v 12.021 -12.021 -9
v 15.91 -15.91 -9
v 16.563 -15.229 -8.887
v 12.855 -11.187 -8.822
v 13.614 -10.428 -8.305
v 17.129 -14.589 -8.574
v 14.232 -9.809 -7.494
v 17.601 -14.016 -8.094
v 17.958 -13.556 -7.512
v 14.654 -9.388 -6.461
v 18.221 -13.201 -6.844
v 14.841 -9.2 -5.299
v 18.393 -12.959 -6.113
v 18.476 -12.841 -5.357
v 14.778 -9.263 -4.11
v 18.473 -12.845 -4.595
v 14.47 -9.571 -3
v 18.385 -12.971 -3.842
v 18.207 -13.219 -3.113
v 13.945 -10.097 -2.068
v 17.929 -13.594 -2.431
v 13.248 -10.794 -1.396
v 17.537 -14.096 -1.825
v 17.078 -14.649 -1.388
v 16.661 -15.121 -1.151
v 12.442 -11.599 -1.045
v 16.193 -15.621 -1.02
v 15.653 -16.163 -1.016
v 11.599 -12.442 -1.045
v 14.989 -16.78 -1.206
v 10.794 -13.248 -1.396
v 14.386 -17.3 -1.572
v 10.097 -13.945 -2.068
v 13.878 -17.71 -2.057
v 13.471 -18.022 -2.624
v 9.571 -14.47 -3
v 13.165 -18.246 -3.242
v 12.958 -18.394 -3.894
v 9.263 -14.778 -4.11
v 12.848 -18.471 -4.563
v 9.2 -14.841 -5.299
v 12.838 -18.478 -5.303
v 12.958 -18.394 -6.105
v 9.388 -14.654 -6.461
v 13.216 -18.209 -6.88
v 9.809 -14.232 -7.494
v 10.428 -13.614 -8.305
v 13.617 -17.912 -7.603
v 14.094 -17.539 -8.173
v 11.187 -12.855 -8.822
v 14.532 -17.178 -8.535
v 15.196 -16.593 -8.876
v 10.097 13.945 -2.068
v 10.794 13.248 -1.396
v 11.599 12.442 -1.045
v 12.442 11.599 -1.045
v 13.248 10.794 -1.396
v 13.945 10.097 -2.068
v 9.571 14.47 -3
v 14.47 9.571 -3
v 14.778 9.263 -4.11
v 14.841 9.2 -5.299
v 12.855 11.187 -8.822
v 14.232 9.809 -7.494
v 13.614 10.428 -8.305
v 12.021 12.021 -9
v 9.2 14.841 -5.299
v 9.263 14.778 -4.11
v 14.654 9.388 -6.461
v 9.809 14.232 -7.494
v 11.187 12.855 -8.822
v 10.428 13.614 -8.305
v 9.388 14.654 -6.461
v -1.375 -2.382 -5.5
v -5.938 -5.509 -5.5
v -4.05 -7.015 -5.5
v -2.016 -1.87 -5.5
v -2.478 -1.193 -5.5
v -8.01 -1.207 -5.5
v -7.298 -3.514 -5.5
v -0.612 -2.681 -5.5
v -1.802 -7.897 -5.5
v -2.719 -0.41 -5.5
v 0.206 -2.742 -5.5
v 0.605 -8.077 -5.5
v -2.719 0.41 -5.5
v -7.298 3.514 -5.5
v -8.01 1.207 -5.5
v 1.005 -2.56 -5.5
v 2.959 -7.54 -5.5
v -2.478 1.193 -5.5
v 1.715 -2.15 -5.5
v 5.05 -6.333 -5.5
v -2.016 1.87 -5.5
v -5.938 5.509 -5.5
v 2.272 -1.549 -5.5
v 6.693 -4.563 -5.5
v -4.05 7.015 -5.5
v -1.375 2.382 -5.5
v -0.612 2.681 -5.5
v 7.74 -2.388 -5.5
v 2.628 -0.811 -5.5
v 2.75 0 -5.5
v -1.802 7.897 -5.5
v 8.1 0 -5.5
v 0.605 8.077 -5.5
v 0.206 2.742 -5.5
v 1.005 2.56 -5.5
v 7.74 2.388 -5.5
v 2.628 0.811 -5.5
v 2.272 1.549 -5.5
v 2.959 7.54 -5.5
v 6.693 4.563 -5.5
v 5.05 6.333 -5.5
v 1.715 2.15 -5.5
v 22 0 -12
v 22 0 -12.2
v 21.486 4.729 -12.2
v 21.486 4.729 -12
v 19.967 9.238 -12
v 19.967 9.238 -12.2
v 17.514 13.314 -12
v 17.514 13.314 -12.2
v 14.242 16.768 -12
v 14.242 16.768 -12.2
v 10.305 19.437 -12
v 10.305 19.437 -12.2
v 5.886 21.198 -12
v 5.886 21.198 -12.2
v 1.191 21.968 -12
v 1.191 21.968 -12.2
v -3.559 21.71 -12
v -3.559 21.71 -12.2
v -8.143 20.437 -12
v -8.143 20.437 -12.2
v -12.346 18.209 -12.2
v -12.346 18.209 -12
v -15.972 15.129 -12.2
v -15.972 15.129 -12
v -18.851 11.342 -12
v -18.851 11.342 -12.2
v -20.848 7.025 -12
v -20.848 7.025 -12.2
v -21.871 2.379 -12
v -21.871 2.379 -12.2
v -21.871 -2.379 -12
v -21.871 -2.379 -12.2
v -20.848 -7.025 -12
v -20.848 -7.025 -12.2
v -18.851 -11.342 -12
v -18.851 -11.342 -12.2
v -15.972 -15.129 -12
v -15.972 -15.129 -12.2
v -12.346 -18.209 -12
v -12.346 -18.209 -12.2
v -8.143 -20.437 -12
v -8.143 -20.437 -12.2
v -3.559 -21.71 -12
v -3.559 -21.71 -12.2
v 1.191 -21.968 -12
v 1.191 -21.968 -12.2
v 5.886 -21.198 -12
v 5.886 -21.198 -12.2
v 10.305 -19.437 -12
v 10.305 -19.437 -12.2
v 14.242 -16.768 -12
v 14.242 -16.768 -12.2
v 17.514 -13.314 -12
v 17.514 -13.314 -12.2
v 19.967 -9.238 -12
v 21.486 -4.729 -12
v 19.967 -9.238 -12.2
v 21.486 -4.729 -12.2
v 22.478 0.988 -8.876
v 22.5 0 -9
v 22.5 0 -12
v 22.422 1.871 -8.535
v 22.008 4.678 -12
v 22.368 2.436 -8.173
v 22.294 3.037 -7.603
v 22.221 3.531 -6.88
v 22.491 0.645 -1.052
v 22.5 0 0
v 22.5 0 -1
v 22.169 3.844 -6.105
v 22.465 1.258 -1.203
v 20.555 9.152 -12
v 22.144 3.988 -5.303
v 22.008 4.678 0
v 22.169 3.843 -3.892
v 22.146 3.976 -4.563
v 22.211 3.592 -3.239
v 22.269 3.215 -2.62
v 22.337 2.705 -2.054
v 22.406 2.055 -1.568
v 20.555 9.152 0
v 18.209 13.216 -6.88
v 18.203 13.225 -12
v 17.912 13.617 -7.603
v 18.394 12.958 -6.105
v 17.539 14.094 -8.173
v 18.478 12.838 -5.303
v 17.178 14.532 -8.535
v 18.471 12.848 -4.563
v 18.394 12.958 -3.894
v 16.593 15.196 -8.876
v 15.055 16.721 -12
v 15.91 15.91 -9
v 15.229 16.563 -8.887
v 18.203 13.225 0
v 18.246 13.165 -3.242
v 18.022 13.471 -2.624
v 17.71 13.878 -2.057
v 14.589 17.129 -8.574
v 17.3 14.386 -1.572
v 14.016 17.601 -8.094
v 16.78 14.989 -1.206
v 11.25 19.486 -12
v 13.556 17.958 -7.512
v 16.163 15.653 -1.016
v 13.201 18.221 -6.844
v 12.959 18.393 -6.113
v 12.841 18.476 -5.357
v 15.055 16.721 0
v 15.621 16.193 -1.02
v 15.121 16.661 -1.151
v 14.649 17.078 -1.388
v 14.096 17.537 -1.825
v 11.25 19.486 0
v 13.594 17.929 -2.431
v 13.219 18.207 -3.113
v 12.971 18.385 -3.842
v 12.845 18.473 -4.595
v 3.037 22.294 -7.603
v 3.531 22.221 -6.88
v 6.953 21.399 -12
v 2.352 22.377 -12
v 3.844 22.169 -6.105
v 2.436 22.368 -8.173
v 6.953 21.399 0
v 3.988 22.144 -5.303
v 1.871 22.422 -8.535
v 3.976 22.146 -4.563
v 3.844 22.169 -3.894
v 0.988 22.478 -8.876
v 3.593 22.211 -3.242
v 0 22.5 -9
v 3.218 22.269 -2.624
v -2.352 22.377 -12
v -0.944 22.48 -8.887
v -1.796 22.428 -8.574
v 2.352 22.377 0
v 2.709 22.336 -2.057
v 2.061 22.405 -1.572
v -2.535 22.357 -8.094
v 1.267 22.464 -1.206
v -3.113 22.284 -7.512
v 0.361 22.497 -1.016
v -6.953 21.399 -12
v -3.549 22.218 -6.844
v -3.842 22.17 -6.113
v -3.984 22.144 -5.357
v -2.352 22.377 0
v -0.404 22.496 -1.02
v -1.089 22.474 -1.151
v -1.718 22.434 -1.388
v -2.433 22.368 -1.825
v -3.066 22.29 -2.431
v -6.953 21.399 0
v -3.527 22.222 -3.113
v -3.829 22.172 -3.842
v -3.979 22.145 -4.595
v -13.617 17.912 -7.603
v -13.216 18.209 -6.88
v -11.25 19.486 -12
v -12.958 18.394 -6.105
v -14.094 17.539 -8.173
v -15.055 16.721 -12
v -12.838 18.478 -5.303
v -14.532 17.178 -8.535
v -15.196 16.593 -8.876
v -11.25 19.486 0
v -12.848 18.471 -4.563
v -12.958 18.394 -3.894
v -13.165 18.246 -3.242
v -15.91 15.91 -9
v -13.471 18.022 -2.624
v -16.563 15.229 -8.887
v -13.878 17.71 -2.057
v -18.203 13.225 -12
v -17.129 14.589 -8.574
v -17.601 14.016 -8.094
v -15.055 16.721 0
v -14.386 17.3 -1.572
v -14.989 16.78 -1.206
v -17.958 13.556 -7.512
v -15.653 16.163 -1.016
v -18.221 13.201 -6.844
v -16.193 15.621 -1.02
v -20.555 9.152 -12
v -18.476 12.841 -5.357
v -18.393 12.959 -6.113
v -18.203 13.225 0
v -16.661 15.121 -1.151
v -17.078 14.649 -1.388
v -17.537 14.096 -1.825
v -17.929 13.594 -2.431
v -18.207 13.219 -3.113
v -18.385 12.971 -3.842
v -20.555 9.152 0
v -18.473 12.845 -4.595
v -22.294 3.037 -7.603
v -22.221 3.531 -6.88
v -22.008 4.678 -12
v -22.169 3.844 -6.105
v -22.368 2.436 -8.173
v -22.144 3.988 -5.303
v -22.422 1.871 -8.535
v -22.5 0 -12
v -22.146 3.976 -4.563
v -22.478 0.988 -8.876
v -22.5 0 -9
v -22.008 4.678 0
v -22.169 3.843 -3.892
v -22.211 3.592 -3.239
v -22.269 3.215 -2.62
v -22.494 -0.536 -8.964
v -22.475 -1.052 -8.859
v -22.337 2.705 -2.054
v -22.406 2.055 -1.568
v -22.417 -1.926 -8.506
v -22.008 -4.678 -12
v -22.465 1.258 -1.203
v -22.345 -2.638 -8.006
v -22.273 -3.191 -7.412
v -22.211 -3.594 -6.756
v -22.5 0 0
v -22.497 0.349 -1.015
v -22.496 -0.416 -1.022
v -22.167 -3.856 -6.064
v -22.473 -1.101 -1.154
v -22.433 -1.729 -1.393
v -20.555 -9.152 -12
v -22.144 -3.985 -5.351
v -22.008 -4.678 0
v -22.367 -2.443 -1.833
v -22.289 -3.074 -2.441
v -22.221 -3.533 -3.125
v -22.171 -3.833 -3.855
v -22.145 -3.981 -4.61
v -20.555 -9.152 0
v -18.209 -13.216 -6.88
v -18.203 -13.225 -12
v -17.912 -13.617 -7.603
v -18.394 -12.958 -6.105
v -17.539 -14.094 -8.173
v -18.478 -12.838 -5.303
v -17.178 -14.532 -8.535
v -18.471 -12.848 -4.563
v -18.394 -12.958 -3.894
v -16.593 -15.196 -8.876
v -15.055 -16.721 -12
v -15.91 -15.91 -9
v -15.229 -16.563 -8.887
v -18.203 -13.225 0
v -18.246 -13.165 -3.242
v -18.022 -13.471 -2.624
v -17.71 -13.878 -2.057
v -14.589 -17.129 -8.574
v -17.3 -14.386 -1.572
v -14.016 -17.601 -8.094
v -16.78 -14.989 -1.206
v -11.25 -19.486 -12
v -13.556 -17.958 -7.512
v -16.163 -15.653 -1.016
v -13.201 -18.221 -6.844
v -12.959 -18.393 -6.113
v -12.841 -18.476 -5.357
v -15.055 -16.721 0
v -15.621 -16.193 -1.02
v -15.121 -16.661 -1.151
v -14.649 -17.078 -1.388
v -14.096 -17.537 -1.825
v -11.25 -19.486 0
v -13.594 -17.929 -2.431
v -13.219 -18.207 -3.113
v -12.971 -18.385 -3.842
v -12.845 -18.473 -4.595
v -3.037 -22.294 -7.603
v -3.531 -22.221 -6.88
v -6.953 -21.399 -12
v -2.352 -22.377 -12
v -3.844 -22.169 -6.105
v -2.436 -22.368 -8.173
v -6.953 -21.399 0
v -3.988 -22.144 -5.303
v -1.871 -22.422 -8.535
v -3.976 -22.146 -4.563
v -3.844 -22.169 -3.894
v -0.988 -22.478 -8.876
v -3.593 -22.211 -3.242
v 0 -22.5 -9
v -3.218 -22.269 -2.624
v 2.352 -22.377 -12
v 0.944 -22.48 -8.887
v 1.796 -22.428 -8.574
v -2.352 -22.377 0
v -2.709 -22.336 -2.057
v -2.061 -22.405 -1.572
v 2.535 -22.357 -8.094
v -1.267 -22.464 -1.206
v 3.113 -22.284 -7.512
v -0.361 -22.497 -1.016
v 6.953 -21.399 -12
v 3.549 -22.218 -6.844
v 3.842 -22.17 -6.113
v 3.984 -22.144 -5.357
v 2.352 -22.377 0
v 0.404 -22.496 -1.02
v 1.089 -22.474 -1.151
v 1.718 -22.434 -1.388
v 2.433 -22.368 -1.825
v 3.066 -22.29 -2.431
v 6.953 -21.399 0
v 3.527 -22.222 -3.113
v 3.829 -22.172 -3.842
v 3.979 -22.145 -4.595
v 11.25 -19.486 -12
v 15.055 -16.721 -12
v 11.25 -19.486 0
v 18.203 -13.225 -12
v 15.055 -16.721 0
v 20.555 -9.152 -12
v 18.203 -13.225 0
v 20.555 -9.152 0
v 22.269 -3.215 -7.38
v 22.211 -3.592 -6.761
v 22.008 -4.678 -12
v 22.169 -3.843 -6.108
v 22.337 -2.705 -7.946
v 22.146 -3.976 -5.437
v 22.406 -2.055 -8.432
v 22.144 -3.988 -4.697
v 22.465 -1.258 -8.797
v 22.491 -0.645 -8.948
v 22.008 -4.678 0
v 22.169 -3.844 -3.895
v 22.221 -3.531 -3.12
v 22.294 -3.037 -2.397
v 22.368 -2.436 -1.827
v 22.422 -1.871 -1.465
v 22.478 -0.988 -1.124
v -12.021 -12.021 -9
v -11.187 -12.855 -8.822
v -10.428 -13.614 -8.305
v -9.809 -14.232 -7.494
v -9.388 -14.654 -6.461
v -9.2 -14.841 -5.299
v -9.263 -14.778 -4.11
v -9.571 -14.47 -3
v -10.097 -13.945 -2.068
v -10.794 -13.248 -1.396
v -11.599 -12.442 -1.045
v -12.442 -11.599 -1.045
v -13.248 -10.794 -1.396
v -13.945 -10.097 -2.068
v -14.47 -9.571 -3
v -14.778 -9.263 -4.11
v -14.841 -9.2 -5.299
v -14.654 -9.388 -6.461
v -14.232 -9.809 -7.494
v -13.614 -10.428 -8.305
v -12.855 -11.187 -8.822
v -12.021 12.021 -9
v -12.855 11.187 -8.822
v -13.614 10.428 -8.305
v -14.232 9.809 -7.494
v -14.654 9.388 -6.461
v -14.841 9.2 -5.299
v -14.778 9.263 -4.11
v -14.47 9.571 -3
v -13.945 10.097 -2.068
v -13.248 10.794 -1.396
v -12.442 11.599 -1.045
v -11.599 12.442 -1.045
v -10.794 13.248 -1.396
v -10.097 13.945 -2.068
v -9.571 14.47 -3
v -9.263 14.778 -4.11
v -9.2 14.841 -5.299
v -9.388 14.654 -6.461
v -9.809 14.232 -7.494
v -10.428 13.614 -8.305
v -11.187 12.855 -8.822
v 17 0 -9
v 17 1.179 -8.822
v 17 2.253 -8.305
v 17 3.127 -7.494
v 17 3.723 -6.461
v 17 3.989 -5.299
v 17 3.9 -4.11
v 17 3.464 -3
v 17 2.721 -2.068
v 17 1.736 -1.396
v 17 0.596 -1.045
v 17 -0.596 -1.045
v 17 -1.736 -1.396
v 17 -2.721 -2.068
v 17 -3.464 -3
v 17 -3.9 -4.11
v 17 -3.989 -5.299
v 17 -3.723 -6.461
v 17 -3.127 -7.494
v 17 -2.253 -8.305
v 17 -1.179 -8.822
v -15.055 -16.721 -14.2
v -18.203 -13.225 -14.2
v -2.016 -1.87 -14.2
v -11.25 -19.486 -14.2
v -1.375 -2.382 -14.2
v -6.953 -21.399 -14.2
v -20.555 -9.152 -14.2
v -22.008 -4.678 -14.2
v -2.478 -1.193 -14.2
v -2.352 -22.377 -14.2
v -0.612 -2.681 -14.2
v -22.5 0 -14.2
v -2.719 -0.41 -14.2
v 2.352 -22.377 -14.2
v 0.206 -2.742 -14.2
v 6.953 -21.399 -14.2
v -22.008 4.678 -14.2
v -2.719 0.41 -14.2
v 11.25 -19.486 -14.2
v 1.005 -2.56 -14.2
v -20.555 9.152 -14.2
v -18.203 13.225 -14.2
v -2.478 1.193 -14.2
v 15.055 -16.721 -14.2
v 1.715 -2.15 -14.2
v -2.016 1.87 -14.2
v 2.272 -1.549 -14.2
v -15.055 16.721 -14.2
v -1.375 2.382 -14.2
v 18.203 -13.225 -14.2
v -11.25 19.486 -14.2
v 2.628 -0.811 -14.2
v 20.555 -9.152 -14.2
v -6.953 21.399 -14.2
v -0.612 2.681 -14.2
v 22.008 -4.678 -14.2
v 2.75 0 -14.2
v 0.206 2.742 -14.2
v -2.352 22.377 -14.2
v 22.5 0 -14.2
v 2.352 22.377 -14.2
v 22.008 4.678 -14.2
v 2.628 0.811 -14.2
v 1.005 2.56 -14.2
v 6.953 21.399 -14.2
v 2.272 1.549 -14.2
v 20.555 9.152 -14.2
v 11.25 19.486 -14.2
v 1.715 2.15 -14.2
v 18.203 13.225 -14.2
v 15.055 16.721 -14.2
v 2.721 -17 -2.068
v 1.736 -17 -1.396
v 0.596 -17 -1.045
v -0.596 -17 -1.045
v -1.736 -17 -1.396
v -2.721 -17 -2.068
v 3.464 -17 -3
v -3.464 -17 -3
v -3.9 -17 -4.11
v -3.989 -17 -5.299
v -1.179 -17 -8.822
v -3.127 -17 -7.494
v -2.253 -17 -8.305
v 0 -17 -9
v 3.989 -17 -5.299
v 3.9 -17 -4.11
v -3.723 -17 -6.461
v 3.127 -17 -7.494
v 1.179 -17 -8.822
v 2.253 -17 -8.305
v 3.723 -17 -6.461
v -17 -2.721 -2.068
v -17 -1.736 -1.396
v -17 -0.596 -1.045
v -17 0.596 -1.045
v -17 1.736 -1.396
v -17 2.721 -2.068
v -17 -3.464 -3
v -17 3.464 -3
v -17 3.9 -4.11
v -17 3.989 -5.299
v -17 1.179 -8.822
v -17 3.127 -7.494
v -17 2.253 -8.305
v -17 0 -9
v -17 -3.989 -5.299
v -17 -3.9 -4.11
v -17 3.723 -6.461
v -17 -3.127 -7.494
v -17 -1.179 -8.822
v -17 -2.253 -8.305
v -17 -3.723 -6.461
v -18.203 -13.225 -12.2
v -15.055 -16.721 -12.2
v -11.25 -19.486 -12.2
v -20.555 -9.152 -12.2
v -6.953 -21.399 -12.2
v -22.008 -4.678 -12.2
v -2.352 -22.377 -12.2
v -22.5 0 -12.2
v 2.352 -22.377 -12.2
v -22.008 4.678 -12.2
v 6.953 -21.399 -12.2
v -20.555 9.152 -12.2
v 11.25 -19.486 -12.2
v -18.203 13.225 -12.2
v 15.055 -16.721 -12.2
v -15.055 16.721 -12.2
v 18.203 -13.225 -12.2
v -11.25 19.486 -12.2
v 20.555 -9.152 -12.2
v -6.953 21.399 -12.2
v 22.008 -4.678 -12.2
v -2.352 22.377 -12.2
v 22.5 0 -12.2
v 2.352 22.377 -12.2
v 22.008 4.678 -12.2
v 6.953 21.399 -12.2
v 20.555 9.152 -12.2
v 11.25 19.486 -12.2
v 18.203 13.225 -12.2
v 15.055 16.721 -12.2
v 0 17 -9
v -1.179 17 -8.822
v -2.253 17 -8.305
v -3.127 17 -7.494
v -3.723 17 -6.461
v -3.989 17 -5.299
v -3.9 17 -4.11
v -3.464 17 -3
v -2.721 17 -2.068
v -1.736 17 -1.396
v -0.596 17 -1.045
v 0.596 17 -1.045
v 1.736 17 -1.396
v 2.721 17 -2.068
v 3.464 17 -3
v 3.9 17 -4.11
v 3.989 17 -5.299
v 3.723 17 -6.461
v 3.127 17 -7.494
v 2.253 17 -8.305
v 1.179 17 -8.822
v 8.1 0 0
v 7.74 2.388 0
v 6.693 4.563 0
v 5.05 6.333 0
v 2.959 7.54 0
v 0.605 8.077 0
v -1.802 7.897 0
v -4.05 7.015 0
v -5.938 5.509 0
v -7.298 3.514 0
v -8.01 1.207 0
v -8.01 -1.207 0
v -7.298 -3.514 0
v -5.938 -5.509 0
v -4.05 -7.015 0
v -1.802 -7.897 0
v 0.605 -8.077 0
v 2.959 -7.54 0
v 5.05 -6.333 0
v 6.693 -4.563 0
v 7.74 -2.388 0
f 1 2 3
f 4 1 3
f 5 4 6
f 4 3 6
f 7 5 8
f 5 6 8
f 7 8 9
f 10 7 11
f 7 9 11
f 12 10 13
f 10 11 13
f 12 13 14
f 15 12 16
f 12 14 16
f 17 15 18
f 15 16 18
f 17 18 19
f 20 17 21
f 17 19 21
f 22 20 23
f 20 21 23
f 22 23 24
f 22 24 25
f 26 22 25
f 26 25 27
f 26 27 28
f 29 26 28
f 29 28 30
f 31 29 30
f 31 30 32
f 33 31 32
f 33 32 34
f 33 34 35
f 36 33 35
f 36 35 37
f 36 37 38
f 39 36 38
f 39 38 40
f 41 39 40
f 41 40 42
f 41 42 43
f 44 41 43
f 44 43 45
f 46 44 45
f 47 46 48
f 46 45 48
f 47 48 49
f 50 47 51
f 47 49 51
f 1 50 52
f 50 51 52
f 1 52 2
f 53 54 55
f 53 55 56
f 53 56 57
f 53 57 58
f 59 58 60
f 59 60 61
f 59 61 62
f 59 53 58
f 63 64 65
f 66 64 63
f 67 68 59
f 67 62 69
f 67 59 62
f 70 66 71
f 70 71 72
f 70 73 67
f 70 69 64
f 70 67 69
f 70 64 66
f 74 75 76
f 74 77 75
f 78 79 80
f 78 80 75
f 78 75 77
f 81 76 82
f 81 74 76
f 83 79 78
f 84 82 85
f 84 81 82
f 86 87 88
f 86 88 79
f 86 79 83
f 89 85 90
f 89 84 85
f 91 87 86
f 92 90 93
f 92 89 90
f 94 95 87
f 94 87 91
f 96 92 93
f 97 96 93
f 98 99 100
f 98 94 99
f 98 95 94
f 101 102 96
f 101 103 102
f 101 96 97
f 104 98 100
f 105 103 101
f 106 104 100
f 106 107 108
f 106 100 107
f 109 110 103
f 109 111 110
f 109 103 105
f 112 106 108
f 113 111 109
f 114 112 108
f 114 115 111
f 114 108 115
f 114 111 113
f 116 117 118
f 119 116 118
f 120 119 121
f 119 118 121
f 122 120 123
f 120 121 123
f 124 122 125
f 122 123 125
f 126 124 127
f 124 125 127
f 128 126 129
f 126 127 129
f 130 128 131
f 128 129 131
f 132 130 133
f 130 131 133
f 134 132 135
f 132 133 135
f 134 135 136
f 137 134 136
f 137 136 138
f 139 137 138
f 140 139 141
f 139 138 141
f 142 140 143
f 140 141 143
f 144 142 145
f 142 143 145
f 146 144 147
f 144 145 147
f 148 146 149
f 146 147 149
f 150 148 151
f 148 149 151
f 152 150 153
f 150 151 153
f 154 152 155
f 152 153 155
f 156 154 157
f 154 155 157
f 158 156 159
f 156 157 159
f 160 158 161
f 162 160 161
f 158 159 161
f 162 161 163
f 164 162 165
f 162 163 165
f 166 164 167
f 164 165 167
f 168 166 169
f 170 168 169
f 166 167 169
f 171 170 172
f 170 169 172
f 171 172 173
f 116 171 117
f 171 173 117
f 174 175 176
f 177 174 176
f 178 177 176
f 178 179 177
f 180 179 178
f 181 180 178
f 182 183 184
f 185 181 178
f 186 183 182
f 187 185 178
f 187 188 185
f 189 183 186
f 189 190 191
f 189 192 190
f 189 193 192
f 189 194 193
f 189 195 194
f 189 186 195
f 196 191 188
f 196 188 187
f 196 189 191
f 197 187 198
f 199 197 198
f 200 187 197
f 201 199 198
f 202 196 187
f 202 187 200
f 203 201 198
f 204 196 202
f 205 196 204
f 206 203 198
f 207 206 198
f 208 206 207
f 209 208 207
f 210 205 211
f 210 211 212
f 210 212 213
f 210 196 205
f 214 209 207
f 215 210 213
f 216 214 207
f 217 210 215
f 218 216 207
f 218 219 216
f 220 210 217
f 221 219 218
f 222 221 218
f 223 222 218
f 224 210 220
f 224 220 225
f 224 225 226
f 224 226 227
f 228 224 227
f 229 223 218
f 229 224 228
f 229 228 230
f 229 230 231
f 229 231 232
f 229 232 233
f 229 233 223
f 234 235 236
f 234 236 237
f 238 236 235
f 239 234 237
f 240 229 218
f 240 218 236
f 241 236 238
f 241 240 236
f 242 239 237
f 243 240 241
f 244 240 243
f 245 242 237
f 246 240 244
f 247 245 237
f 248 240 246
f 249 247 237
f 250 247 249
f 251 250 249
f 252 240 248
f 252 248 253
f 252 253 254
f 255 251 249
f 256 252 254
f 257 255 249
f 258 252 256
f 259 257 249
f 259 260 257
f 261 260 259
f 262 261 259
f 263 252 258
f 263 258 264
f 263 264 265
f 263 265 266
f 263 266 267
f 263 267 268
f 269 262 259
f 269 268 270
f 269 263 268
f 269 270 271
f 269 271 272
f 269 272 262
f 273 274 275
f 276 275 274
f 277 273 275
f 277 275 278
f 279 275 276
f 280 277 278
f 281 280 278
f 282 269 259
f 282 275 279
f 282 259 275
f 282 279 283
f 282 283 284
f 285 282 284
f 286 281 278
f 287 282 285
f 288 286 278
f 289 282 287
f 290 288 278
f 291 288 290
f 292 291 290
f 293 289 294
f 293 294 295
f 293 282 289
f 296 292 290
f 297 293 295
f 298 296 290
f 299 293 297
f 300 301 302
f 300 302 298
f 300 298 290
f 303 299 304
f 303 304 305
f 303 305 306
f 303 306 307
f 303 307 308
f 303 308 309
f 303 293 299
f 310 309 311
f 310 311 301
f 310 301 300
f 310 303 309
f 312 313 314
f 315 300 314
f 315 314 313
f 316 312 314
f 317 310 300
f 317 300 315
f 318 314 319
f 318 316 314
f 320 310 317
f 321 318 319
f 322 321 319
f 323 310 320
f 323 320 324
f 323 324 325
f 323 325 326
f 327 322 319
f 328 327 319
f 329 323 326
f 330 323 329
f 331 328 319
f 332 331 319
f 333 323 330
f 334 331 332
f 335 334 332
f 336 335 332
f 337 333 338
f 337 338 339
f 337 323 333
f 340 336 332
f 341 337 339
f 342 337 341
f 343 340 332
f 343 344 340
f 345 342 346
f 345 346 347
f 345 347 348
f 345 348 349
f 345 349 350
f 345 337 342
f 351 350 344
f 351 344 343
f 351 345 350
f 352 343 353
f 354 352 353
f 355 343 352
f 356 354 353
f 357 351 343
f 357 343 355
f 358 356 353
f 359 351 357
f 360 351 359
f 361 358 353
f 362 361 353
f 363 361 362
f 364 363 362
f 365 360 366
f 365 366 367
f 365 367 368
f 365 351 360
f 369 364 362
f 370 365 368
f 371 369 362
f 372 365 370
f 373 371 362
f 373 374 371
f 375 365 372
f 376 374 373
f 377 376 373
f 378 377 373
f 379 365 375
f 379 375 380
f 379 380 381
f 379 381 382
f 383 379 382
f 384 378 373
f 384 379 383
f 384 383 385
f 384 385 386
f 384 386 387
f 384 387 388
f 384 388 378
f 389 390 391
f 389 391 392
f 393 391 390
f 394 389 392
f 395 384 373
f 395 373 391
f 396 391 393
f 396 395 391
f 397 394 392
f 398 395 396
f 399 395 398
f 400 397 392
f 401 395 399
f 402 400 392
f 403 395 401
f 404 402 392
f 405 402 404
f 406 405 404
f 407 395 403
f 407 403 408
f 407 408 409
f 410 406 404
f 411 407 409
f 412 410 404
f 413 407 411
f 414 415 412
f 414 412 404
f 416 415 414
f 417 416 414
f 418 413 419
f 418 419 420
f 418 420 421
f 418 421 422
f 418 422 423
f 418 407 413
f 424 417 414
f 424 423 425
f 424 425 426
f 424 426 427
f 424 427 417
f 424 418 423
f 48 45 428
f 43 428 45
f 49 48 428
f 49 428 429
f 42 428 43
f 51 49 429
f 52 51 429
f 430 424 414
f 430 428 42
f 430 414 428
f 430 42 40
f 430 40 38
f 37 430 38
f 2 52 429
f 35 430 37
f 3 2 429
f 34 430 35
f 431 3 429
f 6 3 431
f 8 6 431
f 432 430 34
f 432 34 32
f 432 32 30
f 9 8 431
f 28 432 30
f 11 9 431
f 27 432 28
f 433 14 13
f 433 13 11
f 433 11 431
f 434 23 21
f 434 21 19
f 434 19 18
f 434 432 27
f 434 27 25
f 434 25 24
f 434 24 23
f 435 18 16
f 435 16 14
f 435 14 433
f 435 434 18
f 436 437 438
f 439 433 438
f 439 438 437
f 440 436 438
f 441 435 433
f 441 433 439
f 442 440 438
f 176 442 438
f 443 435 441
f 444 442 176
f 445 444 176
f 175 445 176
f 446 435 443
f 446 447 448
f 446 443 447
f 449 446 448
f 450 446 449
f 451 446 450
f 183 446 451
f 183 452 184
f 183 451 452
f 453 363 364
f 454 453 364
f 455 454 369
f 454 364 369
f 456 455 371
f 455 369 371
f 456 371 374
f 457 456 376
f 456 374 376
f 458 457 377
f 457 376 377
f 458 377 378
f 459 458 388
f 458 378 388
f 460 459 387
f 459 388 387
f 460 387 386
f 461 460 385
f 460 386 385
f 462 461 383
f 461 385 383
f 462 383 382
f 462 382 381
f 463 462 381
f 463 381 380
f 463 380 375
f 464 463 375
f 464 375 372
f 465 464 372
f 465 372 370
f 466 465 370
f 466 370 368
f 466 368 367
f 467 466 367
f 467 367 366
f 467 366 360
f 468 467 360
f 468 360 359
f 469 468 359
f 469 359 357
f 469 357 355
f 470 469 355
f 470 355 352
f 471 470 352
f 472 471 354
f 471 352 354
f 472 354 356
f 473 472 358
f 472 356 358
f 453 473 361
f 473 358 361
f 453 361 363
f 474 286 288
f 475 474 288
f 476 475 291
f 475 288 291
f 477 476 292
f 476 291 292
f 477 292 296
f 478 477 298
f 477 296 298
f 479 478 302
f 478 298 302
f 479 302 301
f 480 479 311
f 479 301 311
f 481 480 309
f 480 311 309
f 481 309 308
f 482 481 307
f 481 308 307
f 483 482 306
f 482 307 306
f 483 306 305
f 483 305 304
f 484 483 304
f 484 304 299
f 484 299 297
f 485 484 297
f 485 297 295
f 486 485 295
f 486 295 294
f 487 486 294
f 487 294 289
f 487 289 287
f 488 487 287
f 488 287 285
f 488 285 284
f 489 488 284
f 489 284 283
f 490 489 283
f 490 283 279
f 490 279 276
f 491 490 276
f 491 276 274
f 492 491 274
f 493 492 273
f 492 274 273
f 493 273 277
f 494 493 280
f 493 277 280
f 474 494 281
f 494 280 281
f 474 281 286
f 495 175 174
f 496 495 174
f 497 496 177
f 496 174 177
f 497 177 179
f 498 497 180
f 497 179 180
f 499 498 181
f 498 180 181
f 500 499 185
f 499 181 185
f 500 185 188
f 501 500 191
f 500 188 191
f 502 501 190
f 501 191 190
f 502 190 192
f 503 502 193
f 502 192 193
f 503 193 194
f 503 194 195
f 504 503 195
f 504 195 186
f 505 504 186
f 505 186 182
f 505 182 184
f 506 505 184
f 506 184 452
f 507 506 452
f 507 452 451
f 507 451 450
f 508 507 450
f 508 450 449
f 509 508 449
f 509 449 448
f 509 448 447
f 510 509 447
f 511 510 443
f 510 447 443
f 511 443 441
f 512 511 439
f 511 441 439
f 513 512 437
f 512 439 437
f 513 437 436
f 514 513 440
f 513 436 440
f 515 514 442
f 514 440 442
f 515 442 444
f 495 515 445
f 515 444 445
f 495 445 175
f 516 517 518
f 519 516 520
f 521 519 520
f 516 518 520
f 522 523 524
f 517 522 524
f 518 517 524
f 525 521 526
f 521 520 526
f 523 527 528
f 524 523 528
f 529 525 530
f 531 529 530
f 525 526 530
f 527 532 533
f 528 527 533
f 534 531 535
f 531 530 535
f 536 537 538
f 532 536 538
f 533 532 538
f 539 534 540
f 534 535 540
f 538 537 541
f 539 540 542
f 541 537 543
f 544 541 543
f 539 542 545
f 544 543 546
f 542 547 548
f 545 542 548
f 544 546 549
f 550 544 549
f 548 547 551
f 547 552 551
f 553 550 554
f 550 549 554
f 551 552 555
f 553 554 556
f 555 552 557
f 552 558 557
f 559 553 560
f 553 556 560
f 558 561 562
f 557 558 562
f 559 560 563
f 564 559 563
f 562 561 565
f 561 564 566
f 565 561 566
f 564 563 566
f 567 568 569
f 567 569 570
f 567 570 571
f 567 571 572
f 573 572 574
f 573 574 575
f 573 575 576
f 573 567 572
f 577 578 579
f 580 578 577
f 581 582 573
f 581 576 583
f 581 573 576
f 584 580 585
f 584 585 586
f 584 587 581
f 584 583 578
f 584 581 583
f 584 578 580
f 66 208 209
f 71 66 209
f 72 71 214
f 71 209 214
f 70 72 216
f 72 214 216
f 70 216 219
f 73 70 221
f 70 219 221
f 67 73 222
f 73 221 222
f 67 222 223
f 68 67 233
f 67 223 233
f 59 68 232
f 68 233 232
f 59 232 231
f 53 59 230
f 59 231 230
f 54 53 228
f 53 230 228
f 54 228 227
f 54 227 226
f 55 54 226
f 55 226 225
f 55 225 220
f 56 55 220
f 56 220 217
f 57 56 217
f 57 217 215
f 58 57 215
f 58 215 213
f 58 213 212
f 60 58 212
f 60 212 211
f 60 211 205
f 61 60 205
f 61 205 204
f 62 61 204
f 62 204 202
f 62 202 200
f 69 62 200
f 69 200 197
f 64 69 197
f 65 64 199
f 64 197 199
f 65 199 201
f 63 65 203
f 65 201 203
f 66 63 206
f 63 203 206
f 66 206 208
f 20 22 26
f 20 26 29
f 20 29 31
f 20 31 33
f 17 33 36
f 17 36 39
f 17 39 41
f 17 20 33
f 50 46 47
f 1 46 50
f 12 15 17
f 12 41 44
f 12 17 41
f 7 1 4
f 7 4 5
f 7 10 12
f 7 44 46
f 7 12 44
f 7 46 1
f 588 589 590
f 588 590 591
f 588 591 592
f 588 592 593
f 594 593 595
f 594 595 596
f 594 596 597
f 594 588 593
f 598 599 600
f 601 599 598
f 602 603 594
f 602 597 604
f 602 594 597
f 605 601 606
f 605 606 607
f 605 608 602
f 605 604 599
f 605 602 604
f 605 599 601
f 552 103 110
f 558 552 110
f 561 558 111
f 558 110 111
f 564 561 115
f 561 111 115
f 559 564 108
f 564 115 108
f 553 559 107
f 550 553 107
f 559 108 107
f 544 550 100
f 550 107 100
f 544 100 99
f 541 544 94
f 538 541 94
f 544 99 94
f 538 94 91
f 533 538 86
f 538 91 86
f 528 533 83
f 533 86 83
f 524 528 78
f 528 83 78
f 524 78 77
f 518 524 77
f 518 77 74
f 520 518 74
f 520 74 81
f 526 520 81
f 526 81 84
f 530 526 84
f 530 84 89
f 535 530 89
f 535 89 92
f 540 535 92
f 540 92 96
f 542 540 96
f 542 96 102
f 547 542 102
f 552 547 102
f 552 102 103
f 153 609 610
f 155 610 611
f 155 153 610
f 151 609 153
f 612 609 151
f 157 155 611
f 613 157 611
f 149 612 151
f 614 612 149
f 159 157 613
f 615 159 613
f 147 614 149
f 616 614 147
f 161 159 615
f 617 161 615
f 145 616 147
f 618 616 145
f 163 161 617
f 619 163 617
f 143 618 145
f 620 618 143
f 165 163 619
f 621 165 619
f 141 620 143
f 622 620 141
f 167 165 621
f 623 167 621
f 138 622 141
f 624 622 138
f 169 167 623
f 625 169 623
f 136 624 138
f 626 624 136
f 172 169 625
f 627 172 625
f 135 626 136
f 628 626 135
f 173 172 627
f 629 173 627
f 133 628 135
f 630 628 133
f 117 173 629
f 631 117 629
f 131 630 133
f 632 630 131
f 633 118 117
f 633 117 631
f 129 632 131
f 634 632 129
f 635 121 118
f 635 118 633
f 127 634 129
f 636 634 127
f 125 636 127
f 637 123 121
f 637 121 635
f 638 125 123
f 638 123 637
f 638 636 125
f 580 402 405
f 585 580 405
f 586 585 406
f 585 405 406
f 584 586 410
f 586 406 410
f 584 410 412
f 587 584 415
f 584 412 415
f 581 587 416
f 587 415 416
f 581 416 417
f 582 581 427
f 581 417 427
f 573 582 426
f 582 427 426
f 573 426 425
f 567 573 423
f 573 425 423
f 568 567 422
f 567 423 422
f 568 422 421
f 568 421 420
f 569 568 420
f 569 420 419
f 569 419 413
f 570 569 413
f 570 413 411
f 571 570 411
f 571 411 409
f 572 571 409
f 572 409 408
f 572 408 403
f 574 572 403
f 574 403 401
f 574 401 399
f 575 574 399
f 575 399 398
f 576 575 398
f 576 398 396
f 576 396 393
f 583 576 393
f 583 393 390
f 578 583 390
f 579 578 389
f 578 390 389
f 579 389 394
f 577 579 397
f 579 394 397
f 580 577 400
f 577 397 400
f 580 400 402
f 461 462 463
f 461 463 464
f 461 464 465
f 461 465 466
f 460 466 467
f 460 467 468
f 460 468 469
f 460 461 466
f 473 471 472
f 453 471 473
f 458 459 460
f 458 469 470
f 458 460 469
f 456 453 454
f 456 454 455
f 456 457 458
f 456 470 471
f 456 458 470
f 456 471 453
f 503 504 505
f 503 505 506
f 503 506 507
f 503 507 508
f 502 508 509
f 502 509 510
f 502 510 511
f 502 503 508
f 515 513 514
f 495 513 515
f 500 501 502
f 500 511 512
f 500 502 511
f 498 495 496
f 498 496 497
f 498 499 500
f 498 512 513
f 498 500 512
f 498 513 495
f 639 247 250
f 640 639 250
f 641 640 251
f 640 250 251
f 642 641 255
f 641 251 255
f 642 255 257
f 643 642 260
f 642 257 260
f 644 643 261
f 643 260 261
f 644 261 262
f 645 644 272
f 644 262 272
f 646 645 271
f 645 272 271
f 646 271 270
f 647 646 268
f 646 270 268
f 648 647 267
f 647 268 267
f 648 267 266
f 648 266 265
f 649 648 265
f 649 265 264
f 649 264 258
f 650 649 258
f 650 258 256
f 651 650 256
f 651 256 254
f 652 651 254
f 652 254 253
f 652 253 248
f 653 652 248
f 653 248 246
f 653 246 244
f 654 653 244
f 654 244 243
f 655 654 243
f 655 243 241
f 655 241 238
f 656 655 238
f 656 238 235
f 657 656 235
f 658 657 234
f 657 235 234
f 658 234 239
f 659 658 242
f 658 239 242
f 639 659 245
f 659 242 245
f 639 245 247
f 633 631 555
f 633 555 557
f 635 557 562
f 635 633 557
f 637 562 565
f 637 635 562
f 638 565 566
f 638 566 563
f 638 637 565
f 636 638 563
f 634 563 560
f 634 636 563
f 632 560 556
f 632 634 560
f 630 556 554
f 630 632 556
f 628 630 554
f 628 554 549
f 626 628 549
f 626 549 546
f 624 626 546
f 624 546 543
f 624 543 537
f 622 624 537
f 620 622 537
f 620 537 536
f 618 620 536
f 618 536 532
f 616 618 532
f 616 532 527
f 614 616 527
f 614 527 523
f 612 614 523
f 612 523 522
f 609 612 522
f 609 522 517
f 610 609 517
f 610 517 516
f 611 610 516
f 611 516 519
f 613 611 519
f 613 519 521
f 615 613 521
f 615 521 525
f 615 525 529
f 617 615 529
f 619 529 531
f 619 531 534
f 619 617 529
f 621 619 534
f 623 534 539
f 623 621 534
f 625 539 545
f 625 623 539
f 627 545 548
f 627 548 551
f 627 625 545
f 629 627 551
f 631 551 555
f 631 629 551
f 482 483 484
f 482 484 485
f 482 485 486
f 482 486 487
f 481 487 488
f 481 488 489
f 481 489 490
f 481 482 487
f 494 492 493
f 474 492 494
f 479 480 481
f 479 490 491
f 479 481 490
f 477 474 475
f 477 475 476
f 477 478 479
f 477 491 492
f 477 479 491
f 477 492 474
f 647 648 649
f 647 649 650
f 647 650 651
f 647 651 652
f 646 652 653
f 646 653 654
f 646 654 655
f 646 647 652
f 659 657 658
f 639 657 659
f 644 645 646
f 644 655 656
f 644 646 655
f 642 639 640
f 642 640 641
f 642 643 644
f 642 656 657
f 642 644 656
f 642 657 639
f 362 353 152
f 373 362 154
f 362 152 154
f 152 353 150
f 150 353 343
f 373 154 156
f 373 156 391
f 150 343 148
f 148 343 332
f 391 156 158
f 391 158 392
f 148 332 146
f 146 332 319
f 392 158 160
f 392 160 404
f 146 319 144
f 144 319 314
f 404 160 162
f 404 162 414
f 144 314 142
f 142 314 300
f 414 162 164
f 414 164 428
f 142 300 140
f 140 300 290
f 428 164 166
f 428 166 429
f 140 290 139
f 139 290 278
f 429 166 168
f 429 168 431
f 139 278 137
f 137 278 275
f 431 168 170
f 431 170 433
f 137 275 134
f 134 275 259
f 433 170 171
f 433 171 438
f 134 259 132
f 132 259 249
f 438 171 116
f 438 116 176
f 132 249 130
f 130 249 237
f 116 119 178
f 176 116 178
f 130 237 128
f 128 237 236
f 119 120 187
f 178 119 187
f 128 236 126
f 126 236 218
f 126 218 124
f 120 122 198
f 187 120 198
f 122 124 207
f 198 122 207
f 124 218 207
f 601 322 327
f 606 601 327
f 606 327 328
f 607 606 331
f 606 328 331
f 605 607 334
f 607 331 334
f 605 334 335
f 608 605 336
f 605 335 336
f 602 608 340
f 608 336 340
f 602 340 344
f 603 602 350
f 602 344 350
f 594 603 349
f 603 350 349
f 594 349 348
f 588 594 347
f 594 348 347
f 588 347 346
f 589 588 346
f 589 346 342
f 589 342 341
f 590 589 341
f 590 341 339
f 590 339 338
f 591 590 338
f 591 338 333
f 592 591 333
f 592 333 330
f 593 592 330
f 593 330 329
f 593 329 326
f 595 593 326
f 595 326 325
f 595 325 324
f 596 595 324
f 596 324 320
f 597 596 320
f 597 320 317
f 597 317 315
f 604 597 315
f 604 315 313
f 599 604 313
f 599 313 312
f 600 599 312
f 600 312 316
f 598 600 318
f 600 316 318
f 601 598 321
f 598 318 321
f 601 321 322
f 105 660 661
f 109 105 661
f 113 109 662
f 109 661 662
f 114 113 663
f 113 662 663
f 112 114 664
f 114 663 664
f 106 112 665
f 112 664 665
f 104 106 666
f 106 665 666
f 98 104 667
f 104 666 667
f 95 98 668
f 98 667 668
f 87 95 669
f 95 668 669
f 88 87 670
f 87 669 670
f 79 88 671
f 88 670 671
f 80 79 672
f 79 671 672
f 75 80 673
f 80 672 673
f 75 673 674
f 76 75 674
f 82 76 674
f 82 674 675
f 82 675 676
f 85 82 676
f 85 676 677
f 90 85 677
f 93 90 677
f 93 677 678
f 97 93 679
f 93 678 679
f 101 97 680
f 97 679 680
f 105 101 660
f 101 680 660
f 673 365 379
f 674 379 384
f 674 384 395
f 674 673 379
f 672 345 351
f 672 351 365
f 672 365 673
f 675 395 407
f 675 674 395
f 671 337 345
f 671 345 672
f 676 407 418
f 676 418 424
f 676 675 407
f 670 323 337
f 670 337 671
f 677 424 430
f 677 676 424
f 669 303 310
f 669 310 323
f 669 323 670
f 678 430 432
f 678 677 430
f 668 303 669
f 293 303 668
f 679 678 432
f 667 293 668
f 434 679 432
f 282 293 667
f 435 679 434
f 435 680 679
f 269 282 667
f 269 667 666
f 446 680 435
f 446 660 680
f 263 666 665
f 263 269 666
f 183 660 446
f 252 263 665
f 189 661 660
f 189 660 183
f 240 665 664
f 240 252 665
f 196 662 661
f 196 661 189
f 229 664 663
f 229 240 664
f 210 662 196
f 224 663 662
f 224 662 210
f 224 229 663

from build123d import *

# Parameters (mm, degrees)
SKETCH3_R                 = 22.5
BOSS_EXTRUDE3_DEPTH       = 14.2
SKETCH8_R                 = 4
CUT_EXTRUDE4_DEPTH        = 5.5
SKETCH6_R                 = 2.75
CUT_EXTRUDE6_DEPTH        = 14.2
CIRPATTERN1_COUNT         = 8
SKETCH5_R                 = 8.1
CUT_EXTRUDE7_DEPTH        = 5.5
BOUNDARY_CUT1_START       = -12.2
BOUNDARY_CUT1_OUTLINE_R   = 22.5
BOUNDARY_CUT1_OUTLINE_R_2 = 22
BOUNDARY_CUT1_DEPTH       = 0.2


# Read off the part's stored shape, not the designer's step: Boundary-Cut1
with BuildPart() as part:
    # Sketch3 → Boss-Extrude3 (new body)
    with BuildSketch(Plane.XY):
        Circle(SKETCH3_R)
    extrude(amount=-BOSS_EXTRUDE3_DEPTH)

    # Sketch8 → Cut-Extrude4 (cut)
    with BuildSketch(Plane(origin=(22.5, 0, 0), x_dir=(0, 0, -1), z_dir=(1, 0, 0))):
        with Locations((5, 0)):
            Circle(SKETCH8_R)
    cut_extrude4 = extrude(amount=-CUT_EXTRUDE4_DEPTH, mode=Mode.SUBTRACT)

    # Sketch6 → Cut-Extrude6 (cut)
    with BuildSketch(Plane.XY):
        Circle(SKETCH6_R)
    extrude(amount=-CUT_EXTRUDE6_DEPTH, mode=Mode.SUBTRACT)

    # CirPattern1: Cut-Extrude4 ×8 about axis
    cirpattern1_axis = Axis((0, 0, 0), (0, 0, 1))
    for i in range(1, CIRPATTERN1_COUNT):
        add(cut_extrude4.rotate(cirpattern1_axis, i * 360 / CIRPATTERN1_COUNT), mode=Mode.SUBTRACT)

    # Sketch5 → Cut-Extrude7 (cut)
    with BuildSketch(Plane.XY):
        Circle(SKETCH5_R)
    extrude(amount=-CUT_EXTRUDE7_DEPTH, mode=Mode.SUBTRACT)

    # Boundary-Cut1 outline → Boundary-Cut1 (cut)
    with BuildSketch(Plane.XY.offset(BOUNDARY_CUT1_START)):
        Circle(BOUNDARY_CUT1_OUTLINE_R)
        Circle(BOUNDARY_CUT1_OUTLINE_R_2, mode=Mode.SUBTRACT)
    extrude(amount=BOUNDARY_CUT1_DEPTH, mode=Mode.SUBTRACT)


solid = part.part
